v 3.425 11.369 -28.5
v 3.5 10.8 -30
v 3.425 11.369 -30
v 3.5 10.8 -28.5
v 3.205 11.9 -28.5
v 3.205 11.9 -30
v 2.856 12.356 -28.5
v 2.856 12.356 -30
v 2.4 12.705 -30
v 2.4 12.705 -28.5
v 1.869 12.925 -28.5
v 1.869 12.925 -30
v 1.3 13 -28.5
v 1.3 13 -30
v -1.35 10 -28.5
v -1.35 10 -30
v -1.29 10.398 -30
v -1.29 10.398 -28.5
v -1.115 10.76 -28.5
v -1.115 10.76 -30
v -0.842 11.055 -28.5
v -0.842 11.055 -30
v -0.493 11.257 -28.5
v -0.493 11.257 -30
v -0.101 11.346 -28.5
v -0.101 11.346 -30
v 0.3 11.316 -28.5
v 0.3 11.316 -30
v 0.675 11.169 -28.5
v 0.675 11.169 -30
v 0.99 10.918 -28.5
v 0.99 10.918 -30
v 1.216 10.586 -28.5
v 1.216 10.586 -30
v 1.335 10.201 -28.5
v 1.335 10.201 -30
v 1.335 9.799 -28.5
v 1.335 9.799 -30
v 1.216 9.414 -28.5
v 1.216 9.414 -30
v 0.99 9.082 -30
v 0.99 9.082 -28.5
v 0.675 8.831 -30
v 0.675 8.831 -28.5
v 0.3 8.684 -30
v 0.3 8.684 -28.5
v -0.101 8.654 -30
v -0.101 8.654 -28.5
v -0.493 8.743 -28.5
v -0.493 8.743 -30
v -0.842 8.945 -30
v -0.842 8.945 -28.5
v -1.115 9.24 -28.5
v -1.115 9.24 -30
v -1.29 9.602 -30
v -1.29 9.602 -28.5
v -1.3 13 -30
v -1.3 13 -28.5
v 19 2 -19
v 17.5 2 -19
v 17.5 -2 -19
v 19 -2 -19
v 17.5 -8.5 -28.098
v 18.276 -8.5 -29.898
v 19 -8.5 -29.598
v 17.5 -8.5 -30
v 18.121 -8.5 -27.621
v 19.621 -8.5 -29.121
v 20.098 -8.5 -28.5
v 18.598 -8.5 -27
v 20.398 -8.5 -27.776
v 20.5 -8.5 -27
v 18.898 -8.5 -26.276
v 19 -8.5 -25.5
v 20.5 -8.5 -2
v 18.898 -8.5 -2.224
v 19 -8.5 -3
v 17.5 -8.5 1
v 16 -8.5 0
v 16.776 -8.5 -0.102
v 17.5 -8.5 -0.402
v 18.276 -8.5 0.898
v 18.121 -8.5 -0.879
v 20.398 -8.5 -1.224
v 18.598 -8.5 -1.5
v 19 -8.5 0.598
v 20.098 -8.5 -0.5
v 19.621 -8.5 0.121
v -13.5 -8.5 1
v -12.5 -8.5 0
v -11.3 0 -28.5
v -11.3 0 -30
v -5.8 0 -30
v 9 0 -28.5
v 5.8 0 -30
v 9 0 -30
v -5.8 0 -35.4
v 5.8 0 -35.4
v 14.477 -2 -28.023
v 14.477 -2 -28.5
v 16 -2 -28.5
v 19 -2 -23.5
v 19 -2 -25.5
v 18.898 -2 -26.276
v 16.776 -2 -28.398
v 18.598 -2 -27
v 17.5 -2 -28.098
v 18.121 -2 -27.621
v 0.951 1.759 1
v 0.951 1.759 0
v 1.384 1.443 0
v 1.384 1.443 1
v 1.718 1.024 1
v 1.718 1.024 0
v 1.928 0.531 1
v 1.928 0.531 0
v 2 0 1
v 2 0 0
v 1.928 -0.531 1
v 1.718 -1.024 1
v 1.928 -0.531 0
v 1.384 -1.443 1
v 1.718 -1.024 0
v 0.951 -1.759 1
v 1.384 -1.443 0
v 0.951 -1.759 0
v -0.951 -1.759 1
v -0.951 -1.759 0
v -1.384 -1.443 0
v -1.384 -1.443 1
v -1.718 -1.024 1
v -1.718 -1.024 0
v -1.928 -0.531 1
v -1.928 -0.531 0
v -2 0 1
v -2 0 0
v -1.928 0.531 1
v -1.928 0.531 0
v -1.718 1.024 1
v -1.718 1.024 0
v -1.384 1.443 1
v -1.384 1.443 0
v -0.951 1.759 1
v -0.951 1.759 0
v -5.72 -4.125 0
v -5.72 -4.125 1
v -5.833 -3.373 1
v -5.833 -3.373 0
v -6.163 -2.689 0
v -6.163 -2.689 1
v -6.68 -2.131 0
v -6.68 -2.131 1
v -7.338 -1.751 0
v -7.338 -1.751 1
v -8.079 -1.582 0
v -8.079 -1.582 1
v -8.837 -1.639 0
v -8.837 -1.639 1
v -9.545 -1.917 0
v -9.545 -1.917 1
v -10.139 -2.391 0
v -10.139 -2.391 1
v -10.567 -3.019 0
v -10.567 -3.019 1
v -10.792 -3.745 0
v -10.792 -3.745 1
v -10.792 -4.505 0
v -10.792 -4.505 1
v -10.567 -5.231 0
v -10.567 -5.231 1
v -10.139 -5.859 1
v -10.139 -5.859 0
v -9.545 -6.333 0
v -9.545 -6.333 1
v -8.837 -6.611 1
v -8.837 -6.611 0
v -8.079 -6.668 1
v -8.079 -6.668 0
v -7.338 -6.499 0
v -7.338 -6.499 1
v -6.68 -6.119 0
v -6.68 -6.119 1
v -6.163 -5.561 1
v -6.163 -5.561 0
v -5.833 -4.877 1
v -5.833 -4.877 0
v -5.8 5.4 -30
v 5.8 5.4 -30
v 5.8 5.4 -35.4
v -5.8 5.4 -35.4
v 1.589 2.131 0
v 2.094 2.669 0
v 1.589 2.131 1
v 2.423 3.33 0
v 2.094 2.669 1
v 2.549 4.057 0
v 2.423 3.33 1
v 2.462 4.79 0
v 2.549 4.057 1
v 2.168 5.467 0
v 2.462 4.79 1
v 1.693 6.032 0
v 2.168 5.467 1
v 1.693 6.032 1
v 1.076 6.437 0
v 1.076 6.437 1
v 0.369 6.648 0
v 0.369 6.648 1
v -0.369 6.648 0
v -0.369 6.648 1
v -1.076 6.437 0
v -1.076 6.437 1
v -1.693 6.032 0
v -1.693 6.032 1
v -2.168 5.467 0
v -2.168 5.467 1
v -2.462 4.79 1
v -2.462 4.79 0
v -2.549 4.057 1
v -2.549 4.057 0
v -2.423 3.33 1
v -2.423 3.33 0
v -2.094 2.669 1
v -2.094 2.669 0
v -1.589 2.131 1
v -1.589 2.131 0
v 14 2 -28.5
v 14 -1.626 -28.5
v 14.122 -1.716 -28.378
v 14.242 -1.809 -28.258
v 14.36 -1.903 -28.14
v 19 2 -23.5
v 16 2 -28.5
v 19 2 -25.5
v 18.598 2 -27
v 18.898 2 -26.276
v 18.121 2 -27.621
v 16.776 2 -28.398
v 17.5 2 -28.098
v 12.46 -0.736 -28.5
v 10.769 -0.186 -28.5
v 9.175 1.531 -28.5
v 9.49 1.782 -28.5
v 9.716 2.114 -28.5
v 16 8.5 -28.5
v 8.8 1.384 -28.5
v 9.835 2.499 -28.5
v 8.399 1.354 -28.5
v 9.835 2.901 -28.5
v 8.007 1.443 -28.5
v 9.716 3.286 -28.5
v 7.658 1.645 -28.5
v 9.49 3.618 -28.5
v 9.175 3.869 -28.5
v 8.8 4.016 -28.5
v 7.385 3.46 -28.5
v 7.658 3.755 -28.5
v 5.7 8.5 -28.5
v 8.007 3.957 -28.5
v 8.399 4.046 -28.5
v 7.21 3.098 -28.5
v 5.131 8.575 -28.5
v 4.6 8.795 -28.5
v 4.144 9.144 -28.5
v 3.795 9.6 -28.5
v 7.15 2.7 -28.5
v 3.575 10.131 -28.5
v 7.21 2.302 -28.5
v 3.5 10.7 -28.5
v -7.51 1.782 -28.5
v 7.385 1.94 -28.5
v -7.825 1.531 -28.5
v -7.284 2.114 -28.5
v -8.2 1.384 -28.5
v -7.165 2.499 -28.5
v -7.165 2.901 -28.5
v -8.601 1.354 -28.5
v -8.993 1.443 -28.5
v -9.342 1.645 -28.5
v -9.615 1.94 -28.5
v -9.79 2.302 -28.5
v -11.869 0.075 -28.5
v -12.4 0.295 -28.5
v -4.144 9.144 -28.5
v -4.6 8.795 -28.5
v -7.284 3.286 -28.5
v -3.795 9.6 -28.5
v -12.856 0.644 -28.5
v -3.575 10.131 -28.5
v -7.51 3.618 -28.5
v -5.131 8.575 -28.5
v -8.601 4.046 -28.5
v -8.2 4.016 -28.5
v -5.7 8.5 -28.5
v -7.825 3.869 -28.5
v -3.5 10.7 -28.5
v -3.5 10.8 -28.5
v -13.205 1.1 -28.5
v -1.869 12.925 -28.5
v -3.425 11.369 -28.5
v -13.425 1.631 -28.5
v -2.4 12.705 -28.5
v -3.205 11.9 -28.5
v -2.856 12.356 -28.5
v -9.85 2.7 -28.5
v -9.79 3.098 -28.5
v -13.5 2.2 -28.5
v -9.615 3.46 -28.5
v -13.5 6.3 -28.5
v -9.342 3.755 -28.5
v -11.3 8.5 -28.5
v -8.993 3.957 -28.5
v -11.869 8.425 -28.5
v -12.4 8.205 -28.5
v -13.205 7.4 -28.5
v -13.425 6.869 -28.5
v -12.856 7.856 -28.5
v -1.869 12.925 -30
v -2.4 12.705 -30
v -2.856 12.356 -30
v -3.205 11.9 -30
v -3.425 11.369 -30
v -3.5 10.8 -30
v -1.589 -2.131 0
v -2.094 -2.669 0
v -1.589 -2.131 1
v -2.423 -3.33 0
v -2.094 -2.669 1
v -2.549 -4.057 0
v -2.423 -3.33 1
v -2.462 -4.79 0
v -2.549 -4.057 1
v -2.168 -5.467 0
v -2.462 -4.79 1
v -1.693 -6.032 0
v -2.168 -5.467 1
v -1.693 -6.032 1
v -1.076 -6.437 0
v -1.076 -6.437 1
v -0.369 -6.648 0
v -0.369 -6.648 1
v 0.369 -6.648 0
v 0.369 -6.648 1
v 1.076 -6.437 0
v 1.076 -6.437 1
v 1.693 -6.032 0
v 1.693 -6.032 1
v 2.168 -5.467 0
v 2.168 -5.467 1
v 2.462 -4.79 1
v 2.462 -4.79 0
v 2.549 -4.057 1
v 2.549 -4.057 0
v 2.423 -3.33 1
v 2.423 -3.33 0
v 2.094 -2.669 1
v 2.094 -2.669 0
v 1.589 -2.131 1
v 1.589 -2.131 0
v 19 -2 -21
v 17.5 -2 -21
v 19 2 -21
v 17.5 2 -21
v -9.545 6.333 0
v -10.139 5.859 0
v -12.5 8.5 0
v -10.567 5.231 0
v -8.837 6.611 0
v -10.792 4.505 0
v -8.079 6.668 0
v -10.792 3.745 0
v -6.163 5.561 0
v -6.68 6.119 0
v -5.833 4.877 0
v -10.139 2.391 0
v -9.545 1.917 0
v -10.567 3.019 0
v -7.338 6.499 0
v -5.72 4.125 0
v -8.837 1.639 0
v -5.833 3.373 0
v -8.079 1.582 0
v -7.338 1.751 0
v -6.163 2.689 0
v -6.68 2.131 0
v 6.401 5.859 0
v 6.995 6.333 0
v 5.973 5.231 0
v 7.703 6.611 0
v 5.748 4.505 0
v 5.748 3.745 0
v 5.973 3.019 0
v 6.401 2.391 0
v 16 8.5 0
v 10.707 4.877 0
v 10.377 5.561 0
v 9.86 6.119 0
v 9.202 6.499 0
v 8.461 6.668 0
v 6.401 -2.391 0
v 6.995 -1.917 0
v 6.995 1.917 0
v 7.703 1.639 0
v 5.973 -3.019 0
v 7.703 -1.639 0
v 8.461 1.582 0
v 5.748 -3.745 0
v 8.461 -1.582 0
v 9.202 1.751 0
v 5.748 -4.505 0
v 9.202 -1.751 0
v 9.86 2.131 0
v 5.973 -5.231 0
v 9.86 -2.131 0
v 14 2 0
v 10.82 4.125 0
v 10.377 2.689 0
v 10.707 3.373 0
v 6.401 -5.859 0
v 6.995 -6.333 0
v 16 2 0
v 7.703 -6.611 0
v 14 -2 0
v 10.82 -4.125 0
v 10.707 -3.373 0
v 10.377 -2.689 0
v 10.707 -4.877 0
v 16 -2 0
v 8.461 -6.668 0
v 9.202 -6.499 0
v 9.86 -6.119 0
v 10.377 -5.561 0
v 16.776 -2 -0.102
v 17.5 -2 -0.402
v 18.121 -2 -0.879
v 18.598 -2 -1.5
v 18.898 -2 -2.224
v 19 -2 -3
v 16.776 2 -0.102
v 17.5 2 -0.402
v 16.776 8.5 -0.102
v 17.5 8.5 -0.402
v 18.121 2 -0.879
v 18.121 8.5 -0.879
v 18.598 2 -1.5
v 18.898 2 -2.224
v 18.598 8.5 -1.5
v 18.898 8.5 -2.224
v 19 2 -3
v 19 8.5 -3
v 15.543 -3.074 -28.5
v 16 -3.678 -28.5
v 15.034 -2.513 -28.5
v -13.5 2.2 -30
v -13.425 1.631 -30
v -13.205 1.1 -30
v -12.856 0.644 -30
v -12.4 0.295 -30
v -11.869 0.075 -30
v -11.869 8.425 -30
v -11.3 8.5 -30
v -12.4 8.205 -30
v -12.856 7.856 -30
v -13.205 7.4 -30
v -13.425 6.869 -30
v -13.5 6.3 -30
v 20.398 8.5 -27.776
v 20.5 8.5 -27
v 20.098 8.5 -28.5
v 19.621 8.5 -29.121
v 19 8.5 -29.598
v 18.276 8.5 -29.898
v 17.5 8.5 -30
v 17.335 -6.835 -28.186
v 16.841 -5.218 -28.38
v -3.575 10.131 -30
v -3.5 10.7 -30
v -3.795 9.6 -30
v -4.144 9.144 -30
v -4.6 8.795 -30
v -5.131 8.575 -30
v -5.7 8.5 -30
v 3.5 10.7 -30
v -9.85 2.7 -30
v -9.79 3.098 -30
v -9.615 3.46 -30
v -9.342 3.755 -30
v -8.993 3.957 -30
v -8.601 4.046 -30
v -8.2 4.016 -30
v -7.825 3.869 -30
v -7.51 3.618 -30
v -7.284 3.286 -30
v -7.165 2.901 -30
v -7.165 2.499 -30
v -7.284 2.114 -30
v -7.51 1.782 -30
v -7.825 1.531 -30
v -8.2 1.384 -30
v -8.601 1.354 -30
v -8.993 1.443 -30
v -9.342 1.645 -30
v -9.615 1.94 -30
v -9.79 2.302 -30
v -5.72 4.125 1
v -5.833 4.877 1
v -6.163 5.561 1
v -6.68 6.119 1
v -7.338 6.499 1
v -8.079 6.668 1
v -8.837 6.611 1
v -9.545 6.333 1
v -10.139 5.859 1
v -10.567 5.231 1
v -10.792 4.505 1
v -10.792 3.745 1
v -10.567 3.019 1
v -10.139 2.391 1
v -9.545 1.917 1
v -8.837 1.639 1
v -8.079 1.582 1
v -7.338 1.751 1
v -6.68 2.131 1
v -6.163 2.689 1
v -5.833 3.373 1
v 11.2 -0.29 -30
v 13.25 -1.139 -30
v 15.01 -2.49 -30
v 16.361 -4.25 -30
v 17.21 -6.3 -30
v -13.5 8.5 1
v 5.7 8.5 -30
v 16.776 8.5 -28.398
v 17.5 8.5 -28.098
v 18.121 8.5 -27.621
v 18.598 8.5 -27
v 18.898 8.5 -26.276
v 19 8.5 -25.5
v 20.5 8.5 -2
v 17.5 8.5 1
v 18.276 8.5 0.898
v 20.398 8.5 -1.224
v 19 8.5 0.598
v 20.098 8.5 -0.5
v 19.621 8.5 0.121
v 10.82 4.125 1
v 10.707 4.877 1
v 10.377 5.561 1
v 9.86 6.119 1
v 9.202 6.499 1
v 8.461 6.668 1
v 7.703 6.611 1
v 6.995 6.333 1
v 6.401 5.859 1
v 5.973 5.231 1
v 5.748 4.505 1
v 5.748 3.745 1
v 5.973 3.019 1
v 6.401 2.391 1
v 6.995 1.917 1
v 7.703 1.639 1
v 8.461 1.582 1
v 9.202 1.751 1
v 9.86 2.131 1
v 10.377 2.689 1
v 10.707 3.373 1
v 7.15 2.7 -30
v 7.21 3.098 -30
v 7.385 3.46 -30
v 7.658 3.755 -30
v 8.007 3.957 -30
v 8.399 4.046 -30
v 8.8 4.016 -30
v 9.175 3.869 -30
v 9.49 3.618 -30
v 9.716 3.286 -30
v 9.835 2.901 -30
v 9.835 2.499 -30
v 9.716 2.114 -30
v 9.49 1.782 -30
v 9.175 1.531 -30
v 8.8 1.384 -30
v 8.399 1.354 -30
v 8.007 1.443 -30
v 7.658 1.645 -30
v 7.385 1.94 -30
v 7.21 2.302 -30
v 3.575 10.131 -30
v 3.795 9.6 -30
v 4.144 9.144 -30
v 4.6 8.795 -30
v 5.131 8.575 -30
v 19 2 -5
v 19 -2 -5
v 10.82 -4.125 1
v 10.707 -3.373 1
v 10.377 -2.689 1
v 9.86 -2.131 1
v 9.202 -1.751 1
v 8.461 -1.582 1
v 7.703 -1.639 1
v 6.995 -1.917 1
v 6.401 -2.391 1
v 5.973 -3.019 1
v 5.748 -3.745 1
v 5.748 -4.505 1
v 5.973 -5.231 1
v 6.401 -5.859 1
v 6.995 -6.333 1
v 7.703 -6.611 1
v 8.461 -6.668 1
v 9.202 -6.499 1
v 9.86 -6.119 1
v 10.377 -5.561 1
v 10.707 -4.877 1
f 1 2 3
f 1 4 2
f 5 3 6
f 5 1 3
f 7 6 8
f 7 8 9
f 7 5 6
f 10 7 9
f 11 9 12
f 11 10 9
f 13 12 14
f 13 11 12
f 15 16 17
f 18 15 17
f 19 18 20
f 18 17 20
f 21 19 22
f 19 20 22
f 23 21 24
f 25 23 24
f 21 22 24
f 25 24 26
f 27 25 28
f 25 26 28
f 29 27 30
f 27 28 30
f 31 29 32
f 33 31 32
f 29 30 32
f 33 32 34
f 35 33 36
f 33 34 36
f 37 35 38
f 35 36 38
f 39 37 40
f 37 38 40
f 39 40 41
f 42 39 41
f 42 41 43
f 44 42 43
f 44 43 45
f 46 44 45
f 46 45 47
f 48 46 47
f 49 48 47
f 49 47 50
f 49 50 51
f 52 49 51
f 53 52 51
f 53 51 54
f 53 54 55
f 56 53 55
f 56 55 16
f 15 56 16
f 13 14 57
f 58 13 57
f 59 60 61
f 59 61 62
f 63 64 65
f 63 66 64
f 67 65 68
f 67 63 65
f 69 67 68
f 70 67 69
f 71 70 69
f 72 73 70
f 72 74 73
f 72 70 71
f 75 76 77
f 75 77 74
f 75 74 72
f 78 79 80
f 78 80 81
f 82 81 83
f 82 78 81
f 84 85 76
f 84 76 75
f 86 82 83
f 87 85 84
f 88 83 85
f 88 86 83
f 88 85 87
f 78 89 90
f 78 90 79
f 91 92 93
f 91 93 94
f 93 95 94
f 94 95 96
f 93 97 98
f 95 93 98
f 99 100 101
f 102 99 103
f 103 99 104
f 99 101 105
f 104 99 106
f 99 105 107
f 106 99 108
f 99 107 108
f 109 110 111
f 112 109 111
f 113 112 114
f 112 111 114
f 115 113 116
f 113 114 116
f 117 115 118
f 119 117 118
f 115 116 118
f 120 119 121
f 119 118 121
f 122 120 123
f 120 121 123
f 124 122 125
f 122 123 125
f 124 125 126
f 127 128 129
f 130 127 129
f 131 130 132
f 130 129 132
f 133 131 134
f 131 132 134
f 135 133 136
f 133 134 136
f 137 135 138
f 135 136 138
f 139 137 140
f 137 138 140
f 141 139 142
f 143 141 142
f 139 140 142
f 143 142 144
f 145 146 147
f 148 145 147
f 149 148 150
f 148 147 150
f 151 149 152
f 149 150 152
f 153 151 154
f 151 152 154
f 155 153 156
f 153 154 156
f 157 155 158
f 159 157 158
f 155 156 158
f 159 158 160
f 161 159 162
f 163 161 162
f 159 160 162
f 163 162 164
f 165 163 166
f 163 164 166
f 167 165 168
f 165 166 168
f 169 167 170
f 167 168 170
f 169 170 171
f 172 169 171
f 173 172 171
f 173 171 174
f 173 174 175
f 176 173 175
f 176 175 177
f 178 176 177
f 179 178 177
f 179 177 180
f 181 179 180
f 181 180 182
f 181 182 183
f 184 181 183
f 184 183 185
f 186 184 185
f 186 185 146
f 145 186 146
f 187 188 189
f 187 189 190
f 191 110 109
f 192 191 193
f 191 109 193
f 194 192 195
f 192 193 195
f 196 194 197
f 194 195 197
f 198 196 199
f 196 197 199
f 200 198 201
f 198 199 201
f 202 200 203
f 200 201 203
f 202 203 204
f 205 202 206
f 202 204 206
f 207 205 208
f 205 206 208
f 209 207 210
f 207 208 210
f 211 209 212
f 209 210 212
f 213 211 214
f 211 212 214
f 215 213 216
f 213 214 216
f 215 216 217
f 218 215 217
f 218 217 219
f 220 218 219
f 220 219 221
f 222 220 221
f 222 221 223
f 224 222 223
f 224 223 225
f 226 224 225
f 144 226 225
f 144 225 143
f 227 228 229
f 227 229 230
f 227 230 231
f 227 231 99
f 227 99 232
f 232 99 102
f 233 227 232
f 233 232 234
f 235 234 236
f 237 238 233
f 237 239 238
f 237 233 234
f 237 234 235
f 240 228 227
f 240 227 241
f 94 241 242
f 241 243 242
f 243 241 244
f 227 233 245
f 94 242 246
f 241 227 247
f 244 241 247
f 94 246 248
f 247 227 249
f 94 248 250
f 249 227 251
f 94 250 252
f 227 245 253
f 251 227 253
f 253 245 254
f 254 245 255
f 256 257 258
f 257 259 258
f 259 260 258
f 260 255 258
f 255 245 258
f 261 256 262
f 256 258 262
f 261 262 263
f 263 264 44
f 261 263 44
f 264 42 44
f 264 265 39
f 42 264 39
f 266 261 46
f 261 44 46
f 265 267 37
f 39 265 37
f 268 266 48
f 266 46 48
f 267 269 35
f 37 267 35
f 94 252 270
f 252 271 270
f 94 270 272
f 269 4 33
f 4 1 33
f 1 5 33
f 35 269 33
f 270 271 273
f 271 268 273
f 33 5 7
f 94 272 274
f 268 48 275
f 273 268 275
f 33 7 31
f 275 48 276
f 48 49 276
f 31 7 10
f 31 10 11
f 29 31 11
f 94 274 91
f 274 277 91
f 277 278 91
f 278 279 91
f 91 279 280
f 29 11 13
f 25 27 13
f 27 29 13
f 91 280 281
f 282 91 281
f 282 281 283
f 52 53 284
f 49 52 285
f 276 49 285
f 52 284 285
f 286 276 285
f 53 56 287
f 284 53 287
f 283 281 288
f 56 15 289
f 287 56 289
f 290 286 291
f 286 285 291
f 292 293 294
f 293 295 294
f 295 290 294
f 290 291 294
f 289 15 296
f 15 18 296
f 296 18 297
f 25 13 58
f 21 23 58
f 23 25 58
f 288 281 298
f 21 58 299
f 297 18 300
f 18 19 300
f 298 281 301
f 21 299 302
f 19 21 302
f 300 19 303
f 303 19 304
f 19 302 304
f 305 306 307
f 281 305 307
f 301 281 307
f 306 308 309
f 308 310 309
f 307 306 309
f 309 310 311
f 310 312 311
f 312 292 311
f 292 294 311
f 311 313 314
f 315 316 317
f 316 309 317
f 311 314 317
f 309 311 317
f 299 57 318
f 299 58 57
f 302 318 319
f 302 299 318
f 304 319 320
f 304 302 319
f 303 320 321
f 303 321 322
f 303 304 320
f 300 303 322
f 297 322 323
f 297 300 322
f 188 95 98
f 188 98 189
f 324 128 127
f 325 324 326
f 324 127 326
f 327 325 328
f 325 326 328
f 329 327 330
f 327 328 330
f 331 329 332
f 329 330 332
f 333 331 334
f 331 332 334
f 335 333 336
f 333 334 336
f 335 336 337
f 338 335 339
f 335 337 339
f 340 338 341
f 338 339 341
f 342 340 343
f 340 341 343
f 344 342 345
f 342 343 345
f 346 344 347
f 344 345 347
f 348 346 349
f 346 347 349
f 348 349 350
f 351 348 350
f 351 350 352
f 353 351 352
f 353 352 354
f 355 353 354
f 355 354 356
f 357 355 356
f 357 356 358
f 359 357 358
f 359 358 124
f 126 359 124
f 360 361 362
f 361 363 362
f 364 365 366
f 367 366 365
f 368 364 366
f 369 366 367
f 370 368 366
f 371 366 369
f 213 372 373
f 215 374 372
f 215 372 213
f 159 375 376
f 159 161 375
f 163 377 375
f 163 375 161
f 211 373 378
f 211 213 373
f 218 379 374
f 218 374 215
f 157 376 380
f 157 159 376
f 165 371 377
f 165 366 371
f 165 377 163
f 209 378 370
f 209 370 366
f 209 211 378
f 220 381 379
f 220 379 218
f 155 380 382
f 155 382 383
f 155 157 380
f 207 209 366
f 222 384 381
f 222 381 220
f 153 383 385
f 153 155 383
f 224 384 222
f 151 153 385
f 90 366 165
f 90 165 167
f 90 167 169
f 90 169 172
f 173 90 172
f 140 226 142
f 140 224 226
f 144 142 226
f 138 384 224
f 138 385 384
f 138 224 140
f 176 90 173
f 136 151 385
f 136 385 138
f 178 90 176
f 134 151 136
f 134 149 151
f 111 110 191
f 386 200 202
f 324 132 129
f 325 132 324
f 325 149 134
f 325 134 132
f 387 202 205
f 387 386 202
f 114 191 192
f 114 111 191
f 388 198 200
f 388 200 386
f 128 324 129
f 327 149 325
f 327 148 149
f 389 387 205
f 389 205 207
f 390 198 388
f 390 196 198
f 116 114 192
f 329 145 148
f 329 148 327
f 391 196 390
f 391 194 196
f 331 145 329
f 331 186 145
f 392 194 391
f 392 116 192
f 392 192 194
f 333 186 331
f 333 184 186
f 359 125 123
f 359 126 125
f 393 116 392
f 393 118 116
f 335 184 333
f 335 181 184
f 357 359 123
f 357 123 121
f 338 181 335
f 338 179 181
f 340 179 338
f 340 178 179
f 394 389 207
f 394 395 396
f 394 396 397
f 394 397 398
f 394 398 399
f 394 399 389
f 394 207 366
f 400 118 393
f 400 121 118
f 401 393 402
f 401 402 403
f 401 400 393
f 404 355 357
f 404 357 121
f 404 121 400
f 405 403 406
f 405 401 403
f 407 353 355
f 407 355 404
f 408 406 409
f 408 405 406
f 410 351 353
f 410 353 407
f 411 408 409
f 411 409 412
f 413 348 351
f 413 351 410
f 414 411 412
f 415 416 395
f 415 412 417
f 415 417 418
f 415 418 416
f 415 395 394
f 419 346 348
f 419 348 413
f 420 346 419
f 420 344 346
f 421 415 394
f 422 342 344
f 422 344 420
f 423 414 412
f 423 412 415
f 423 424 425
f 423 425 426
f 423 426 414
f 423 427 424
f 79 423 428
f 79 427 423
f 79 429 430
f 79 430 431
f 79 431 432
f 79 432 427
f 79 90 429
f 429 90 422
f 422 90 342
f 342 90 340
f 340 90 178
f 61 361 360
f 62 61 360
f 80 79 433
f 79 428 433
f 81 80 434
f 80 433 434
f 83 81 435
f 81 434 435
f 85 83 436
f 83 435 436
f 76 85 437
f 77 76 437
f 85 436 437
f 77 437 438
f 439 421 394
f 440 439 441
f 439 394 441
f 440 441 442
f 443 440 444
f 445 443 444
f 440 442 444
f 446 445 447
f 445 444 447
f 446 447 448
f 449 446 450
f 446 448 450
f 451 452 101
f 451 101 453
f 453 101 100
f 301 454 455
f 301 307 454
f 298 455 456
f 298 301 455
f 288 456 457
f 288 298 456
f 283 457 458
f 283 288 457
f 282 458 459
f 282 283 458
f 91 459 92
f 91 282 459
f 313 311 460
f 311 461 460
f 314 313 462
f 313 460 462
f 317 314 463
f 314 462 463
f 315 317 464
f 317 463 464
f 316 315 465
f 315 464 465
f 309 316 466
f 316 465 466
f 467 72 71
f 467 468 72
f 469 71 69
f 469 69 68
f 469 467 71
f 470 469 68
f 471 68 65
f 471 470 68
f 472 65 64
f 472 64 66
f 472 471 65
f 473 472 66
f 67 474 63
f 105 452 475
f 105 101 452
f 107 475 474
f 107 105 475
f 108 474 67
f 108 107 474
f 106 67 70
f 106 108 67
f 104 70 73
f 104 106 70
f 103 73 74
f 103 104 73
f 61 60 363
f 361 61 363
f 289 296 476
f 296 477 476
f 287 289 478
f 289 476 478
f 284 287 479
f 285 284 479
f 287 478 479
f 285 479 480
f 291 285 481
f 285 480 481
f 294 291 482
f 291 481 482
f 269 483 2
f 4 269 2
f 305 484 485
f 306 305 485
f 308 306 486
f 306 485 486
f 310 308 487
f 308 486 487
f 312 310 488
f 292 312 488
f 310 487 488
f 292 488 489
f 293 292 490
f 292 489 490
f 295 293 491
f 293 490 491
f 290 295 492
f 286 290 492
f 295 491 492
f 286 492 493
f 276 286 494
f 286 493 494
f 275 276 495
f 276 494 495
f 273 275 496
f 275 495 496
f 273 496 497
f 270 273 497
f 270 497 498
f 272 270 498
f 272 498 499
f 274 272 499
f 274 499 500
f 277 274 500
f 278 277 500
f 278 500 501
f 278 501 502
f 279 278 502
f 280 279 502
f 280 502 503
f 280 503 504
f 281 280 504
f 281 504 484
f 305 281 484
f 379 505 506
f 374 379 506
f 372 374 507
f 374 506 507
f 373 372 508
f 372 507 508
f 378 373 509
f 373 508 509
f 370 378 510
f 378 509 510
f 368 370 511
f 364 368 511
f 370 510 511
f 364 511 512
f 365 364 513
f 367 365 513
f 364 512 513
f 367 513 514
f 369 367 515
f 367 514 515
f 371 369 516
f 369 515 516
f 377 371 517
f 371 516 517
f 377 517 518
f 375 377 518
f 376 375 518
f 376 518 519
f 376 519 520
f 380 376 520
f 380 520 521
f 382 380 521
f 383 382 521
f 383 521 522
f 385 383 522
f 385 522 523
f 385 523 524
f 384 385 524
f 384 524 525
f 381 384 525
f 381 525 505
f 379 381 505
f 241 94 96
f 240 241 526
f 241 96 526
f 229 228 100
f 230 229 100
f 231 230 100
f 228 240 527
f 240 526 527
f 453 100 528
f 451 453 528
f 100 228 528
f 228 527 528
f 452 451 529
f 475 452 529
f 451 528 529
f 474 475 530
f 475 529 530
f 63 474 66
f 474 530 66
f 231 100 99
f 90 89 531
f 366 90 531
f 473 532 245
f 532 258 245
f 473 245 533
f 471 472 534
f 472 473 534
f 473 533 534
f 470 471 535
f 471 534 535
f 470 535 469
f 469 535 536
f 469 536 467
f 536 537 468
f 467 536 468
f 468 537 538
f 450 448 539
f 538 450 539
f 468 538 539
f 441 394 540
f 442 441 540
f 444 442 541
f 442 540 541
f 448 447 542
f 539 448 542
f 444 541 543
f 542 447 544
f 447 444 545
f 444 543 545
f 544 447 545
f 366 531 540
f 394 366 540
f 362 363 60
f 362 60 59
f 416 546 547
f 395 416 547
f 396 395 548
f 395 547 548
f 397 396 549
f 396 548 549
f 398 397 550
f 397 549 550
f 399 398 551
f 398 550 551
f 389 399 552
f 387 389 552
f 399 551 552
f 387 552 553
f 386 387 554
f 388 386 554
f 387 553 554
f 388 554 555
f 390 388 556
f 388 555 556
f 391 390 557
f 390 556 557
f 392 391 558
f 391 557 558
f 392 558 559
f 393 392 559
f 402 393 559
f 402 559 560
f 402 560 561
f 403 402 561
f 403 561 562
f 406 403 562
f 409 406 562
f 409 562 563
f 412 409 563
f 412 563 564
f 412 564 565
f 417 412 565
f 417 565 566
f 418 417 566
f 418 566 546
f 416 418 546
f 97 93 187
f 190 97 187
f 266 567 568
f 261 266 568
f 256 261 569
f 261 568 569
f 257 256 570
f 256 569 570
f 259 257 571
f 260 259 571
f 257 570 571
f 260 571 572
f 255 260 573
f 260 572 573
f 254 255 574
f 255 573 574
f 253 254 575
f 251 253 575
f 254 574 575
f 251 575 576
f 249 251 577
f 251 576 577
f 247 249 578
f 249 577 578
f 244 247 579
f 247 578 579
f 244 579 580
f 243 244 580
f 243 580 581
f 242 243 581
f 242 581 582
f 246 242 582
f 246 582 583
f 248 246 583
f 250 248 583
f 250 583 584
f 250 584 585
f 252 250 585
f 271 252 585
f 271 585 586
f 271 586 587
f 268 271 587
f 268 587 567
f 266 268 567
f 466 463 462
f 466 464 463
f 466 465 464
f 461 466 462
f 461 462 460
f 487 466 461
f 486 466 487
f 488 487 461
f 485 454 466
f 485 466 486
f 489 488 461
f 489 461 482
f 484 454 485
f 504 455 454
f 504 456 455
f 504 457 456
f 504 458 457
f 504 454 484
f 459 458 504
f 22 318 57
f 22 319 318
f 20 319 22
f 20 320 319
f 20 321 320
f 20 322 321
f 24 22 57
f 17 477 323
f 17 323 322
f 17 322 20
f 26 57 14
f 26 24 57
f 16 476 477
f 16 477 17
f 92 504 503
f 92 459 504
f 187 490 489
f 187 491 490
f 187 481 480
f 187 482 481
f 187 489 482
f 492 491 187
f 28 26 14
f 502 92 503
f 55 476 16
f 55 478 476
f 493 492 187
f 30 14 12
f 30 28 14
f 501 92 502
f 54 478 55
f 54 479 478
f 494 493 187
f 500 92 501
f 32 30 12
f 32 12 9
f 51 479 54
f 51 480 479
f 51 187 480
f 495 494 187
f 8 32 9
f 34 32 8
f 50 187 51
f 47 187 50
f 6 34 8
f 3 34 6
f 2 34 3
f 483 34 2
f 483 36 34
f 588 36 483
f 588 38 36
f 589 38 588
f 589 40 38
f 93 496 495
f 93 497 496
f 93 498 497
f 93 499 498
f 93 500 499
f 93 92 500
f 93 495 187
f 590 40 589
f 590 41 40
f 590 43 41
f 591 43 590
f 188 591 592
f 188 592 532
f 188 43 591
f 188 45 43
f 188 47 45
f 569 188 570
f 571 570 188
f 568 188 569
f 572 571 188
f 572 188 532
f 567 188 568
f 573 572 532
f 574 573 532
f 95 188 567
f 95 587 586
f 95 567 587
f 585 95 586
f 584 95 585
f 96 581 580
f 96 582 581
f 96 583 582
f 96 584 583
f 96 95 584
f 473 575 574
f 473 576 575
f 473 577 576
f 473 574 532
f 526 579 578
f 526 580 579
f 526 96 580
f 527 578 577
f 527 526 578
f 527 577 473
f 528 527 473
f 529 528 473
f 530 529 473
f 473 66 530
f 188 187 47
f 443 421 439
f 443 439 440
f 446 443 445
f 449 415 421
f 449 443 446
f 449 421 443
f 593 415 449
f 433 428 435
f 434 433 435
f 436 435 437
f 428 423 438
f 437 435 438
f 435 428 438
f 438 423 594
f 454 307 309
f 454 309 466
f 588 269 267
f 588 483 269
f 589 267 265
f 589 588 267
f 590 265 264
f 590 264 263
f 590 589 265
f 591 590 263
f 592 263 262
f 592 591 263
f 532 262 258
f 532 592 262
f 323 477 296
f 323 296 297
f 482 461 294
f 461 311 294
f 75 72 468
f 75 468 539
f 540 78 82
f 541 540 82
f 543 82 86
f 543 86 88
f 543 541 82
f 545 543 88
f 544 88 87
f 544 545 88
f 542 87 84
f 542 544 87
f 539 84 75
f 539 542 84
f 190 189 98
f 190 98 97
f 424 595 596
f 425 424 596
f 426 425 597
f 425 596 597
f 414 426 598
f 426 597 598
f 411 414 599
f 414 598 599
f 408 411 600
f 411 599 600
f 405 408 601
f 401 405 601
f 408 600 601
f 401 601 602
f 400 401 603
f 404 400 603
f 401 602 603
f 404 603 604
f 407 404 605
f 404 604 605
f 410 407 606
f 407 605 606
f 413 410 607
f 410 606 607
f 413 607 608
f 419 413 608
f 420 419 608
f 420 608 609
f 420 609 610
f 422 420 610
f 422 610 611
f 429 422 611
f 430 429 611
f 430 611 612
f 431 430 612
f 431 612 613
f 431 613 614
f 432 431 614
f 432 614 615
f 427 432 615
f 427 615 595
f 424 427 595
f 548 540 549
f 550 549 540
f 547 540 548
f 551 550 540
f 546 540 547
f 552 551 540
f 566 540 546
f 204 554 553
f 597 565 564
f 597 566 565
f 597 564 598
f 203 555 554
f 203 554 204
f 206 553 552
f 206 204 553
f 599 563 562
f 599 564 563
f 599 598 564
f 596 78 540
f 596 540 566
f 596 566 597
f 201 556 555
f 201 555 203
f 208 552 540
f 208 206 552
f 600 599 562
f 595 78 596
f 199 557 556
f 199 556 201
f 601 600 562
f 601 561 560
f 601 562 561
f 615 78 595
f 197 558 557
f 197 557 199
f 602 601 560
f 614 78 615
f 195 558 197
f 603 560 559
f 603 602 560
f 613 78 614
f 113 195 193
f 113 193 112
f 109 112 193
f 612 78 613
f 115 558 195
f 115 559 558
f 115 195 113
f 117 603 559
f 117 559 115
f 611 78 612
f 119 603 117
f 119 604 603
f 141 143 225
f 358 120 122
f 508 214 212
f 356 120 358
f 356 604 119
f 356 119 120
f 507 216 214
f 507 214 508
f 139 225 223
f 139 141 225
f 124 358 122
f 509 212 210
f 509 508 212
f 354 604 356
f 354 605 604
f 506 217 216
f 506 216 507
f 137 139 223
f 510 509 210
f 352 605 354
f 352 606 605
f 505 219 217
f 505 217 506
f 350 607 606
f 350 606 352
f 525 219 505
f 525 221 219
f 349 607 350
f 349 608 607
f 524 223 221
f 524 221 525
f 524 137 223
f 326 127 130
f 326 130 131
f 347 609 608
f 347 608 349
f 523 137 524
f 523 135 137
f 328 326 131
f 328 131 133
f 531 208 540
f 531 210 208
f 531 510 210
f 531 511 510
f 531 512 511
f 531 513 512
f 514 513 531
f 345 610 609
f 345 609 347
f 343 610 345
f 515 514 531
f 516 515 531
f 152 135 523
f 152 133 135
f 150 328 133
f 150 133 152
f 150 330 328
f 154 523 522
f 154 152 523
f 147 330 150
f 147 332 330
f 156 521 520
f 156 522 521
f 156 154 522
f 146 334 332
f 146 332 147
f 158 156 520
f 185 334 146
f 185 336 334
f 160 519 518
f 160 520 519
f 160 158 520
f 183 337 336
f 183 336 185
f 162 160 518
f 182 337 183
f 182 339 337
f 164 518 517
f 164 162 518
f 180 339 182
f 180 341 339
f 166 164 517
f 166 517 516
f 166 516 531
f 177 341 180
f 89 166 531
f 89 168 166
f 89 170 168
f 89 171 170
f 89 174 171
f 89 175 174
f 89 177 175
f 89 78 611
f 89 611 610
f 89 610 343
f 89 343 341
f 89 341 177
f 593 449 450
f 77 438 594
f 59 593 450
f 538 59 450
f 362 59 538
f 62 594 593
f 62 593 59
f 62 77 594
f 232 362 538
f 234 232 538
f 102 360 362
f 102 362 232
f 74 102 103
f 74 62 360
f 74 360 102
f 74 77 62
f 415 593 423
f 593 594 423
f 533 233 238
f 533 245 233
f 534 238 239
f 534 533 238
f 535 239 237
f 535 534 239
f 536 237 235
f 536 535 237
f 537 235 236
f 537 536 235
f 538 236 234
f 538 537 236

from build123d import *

# Parameters (mm, degrees)
SKETCH_1_W          = 27
SKETCH_1_H          = 17
EXTRUDE_1_DEPTH     = 1
SKETCH_2_R          = 2.55
CUT_EXTRUDE_1_DEPTH = 16.984367363
EXTRUDE_2_DEPTH     = 17
SKETCH_6_W          = 1.5
SKETCH_6_H          = 2
EXTRUDE_3_DEPTH     = 2
CHAMFER_1_SIZE      = 1
CUT_EXTRUDE_4_REACH = 39.316
SKETCH_8_R          = 2
FILLET_1_R          = 3
SKETCH_9_W          = 7
SKETCH_9_H          = 13
EXTRUDE_4_DEPTH     = 1.5
SKETCH_7_R          = 1.35
CUT_EXTRUDE_5_DEPTH = 10
CUT_EXTRUDE_6_REACH = 41.373
FILLET_2_R          = 2.2
SKETCH_13_W         = 11.6
SKETCH_13_H         = 5.4
EXTRUDE_6_DEPTH     = 5.4


with BuildPart() as part:
    # 草图1 → 凸台-拉伸1 (new body)
    with BuildSketch(Plane.XY):
        Rectangle(SKETCH_1_W, SKETCH_1_H)
    extrude(amount=EXTRUDE_1_DEPTH)

    # 草图2 → 切除-拉伸1 (cut, through all)
    with BuildSketch(Plane.XY.offset(1)):
        with Locations((0, 4.125)):
            Circle(SKETCH_2_R)
        with Locations((0, -4.125)):
            Circle(SKETCH_2_R)
        with Locations((8.27, 4.125)):
            Circle(SKETCH_2_R)
        with Locations((8.27, -4.125)):
            Circle(SKETCH_2_R)
        with Locations((-8.27, 4.125)):
            Circle(SKETCH_2_R)
        with Locations((-8.27, -4.125)):
            Circle(SKETCH_2_R)
    extrude(amount=-CUT_EXTRUDE_1_DEPTH, mode=Mode.SUBTRACT)

    # 草图3 → 凸台-拉伸2 (add)
    with BuildSketch(Plane.XZ.offset(8.5)):
        Polygon((13.5, 0), (19, 0), (19, -28.5), (-13.5, -28.5), (-13.5, -30), (20.5, -30), (20.5, 1), (13.5, 1), align=None)
    extrude(amount=-EXTRUDE_2_DEPTH)

    # 草图6 → 凸台-拉伸3 (add, symmetric)
    with BuildSketch(Plane(origin=(0, 0, 0), x_dir=(1, 0, 0), z_dir=(0, 1, 0))):
        Polygon((19, 0), (19, 5), (14, 0), align=None)
        Polygon((19, 28.5), (14, 28.5), (19, 23.5), align=None)
        with Locations((18.25, 20)):
            Rectangle(SKETCH_6_W, SKETCH_6_H)
    extrude(amount=EXTRUDE_3_DEPTH, both=True)

    # 倒角1
    chamfer_1_edges = [part.edges().sort_by_distance(p)[0] for p in [
        (-13.5, 0, 0),
    ]]
    chamfer(chamfer_1_edges, length=CHAMFER_1_SIZE - 0.0001)  # a hair under: the kernel refuses the full size

    # 草图8 → 切除-拉伸4 (cut, up to next)
    with BuildSketch(Plane(origin=(0, 0, 0), x_dir=(-1, 0, 0), z_dir=(0, 0, -1)), mode=Mode.PRIVATE) as cut_extrude_4_sk1:
        Circle(SKETCH_8_R)
    cut_extrude_4_tool1 = extrude(cut_extrude_4_sk1.sketch, amount=-CUT_EXTRUDE_4_REACH, mode=Mode.PRIVATE) & part.part
    add(cut_extrude_4_tool1.solids().sort_by_distance((0, 0, 0))[0], mode=Mode.SUBTRACT)

    # 圆角1
    fillet_1_edges = [part.edges().sort_by_distance(p)[0] for p in [
        (20.5, 0, 1),
        (20.5, 0, -30),
        (19, 5.25, -28.5),
        (19, 5.25, 0),
        (19, -5.25, 0),
        (19, -5.25, -28.5),
    ]]
    fillet(fillet_1_edges, radius=FILLET_1_R)

    # 草图9 → 凸台-拉伸4 (add)
    with BuildSketch(Plane(origin=(0, 0, -30), x_dir=(-1, 0, 0), z_dir=(0, 0, -1))):
        with Locations((0, 6.5)):
            Rectangle(SKETCH_9_W, SKETCH_9_H)
    extrude(amount=-EXTRUDE_4_DEPTH)

    # 草图7 → 切除-拉伸5 (cut)
    with BuildSketch(Plane(origin=(0, 0, -30), x_dir=(-1, 0, 0), z_dir=(0, 0, -1))):
        with Locations((0, 10)):
            Circle(SKETCH_7_R)
        with Locations((-8.5, 2.7)):
            Circle(SKETCH_7_R)
        with Locations((8.5, 2.7)):
            Circle(SKETCH_7_R)
    extrude(amount=-CUT_EXTRUDE_5_DEPTH, mode=Mode.SUBTRACT)

    # 草图11 → 切除-拉伸6 (cut, up to next)
    with BuildSketch(Plane(origin=(0, 0, -30), x_dir=(-1, 0, 0), z_dir=(0, 0, -1)), mode=Mode.PRIVATE) as cut_extrude_6_sk1:
        with BuildLine():
            Line((13.5, -8.5), (13.5, 0))
            Line((13.5, 0), (-9, 0))
            ThreePointArc((-9, 0), (-15.01040764, -2.48959236), (-17.5, -8.5))
            Line((-17.5, -8.5), (13.5, -8.5))
        make_face()
    cut_extrude_6_tool1 = extrude(cut_extrude_6_sk1.sketch, amount=-CUT_EXTRUDE_6_REACH, mode=Mode.PRIVATE) & part.part
    add(cut_extrude_6_tool1.solids().sort_by_distance((1.149624, -4.397011, -30))[0], mode=Mode.SUBTRACT)

    # 圆角2
    fillet_2_edges = [part.edges().sort_by_distance(p)[0] for p in [
        (-3.5, 13, -29.25),
        (-3.5, 8.5, -29.25),
        (3.5, 13, -29.25),
        (3.5, 8.5, -29.25),
        (-13.5, 0, -29.25),
        (-13.5, 8.5, -29.25),
    ]]
    fillet(fillet_2_edges, radius=FILLET_2_R)

    # 草图13 → 凸台-拉伸6 (add)
    with BuildSketch(Plane(origin=(0, 0, -30), x_dir=(-1, 0, 0), z_dir=(0, 0, -1))):
        with Locations((0, 2.7)):
            Rectangle(SKETCH_13_W, SKETCH_13_H)
    extrude(amount=EXTRUDE_6_DEPTH)


solid = part.part
